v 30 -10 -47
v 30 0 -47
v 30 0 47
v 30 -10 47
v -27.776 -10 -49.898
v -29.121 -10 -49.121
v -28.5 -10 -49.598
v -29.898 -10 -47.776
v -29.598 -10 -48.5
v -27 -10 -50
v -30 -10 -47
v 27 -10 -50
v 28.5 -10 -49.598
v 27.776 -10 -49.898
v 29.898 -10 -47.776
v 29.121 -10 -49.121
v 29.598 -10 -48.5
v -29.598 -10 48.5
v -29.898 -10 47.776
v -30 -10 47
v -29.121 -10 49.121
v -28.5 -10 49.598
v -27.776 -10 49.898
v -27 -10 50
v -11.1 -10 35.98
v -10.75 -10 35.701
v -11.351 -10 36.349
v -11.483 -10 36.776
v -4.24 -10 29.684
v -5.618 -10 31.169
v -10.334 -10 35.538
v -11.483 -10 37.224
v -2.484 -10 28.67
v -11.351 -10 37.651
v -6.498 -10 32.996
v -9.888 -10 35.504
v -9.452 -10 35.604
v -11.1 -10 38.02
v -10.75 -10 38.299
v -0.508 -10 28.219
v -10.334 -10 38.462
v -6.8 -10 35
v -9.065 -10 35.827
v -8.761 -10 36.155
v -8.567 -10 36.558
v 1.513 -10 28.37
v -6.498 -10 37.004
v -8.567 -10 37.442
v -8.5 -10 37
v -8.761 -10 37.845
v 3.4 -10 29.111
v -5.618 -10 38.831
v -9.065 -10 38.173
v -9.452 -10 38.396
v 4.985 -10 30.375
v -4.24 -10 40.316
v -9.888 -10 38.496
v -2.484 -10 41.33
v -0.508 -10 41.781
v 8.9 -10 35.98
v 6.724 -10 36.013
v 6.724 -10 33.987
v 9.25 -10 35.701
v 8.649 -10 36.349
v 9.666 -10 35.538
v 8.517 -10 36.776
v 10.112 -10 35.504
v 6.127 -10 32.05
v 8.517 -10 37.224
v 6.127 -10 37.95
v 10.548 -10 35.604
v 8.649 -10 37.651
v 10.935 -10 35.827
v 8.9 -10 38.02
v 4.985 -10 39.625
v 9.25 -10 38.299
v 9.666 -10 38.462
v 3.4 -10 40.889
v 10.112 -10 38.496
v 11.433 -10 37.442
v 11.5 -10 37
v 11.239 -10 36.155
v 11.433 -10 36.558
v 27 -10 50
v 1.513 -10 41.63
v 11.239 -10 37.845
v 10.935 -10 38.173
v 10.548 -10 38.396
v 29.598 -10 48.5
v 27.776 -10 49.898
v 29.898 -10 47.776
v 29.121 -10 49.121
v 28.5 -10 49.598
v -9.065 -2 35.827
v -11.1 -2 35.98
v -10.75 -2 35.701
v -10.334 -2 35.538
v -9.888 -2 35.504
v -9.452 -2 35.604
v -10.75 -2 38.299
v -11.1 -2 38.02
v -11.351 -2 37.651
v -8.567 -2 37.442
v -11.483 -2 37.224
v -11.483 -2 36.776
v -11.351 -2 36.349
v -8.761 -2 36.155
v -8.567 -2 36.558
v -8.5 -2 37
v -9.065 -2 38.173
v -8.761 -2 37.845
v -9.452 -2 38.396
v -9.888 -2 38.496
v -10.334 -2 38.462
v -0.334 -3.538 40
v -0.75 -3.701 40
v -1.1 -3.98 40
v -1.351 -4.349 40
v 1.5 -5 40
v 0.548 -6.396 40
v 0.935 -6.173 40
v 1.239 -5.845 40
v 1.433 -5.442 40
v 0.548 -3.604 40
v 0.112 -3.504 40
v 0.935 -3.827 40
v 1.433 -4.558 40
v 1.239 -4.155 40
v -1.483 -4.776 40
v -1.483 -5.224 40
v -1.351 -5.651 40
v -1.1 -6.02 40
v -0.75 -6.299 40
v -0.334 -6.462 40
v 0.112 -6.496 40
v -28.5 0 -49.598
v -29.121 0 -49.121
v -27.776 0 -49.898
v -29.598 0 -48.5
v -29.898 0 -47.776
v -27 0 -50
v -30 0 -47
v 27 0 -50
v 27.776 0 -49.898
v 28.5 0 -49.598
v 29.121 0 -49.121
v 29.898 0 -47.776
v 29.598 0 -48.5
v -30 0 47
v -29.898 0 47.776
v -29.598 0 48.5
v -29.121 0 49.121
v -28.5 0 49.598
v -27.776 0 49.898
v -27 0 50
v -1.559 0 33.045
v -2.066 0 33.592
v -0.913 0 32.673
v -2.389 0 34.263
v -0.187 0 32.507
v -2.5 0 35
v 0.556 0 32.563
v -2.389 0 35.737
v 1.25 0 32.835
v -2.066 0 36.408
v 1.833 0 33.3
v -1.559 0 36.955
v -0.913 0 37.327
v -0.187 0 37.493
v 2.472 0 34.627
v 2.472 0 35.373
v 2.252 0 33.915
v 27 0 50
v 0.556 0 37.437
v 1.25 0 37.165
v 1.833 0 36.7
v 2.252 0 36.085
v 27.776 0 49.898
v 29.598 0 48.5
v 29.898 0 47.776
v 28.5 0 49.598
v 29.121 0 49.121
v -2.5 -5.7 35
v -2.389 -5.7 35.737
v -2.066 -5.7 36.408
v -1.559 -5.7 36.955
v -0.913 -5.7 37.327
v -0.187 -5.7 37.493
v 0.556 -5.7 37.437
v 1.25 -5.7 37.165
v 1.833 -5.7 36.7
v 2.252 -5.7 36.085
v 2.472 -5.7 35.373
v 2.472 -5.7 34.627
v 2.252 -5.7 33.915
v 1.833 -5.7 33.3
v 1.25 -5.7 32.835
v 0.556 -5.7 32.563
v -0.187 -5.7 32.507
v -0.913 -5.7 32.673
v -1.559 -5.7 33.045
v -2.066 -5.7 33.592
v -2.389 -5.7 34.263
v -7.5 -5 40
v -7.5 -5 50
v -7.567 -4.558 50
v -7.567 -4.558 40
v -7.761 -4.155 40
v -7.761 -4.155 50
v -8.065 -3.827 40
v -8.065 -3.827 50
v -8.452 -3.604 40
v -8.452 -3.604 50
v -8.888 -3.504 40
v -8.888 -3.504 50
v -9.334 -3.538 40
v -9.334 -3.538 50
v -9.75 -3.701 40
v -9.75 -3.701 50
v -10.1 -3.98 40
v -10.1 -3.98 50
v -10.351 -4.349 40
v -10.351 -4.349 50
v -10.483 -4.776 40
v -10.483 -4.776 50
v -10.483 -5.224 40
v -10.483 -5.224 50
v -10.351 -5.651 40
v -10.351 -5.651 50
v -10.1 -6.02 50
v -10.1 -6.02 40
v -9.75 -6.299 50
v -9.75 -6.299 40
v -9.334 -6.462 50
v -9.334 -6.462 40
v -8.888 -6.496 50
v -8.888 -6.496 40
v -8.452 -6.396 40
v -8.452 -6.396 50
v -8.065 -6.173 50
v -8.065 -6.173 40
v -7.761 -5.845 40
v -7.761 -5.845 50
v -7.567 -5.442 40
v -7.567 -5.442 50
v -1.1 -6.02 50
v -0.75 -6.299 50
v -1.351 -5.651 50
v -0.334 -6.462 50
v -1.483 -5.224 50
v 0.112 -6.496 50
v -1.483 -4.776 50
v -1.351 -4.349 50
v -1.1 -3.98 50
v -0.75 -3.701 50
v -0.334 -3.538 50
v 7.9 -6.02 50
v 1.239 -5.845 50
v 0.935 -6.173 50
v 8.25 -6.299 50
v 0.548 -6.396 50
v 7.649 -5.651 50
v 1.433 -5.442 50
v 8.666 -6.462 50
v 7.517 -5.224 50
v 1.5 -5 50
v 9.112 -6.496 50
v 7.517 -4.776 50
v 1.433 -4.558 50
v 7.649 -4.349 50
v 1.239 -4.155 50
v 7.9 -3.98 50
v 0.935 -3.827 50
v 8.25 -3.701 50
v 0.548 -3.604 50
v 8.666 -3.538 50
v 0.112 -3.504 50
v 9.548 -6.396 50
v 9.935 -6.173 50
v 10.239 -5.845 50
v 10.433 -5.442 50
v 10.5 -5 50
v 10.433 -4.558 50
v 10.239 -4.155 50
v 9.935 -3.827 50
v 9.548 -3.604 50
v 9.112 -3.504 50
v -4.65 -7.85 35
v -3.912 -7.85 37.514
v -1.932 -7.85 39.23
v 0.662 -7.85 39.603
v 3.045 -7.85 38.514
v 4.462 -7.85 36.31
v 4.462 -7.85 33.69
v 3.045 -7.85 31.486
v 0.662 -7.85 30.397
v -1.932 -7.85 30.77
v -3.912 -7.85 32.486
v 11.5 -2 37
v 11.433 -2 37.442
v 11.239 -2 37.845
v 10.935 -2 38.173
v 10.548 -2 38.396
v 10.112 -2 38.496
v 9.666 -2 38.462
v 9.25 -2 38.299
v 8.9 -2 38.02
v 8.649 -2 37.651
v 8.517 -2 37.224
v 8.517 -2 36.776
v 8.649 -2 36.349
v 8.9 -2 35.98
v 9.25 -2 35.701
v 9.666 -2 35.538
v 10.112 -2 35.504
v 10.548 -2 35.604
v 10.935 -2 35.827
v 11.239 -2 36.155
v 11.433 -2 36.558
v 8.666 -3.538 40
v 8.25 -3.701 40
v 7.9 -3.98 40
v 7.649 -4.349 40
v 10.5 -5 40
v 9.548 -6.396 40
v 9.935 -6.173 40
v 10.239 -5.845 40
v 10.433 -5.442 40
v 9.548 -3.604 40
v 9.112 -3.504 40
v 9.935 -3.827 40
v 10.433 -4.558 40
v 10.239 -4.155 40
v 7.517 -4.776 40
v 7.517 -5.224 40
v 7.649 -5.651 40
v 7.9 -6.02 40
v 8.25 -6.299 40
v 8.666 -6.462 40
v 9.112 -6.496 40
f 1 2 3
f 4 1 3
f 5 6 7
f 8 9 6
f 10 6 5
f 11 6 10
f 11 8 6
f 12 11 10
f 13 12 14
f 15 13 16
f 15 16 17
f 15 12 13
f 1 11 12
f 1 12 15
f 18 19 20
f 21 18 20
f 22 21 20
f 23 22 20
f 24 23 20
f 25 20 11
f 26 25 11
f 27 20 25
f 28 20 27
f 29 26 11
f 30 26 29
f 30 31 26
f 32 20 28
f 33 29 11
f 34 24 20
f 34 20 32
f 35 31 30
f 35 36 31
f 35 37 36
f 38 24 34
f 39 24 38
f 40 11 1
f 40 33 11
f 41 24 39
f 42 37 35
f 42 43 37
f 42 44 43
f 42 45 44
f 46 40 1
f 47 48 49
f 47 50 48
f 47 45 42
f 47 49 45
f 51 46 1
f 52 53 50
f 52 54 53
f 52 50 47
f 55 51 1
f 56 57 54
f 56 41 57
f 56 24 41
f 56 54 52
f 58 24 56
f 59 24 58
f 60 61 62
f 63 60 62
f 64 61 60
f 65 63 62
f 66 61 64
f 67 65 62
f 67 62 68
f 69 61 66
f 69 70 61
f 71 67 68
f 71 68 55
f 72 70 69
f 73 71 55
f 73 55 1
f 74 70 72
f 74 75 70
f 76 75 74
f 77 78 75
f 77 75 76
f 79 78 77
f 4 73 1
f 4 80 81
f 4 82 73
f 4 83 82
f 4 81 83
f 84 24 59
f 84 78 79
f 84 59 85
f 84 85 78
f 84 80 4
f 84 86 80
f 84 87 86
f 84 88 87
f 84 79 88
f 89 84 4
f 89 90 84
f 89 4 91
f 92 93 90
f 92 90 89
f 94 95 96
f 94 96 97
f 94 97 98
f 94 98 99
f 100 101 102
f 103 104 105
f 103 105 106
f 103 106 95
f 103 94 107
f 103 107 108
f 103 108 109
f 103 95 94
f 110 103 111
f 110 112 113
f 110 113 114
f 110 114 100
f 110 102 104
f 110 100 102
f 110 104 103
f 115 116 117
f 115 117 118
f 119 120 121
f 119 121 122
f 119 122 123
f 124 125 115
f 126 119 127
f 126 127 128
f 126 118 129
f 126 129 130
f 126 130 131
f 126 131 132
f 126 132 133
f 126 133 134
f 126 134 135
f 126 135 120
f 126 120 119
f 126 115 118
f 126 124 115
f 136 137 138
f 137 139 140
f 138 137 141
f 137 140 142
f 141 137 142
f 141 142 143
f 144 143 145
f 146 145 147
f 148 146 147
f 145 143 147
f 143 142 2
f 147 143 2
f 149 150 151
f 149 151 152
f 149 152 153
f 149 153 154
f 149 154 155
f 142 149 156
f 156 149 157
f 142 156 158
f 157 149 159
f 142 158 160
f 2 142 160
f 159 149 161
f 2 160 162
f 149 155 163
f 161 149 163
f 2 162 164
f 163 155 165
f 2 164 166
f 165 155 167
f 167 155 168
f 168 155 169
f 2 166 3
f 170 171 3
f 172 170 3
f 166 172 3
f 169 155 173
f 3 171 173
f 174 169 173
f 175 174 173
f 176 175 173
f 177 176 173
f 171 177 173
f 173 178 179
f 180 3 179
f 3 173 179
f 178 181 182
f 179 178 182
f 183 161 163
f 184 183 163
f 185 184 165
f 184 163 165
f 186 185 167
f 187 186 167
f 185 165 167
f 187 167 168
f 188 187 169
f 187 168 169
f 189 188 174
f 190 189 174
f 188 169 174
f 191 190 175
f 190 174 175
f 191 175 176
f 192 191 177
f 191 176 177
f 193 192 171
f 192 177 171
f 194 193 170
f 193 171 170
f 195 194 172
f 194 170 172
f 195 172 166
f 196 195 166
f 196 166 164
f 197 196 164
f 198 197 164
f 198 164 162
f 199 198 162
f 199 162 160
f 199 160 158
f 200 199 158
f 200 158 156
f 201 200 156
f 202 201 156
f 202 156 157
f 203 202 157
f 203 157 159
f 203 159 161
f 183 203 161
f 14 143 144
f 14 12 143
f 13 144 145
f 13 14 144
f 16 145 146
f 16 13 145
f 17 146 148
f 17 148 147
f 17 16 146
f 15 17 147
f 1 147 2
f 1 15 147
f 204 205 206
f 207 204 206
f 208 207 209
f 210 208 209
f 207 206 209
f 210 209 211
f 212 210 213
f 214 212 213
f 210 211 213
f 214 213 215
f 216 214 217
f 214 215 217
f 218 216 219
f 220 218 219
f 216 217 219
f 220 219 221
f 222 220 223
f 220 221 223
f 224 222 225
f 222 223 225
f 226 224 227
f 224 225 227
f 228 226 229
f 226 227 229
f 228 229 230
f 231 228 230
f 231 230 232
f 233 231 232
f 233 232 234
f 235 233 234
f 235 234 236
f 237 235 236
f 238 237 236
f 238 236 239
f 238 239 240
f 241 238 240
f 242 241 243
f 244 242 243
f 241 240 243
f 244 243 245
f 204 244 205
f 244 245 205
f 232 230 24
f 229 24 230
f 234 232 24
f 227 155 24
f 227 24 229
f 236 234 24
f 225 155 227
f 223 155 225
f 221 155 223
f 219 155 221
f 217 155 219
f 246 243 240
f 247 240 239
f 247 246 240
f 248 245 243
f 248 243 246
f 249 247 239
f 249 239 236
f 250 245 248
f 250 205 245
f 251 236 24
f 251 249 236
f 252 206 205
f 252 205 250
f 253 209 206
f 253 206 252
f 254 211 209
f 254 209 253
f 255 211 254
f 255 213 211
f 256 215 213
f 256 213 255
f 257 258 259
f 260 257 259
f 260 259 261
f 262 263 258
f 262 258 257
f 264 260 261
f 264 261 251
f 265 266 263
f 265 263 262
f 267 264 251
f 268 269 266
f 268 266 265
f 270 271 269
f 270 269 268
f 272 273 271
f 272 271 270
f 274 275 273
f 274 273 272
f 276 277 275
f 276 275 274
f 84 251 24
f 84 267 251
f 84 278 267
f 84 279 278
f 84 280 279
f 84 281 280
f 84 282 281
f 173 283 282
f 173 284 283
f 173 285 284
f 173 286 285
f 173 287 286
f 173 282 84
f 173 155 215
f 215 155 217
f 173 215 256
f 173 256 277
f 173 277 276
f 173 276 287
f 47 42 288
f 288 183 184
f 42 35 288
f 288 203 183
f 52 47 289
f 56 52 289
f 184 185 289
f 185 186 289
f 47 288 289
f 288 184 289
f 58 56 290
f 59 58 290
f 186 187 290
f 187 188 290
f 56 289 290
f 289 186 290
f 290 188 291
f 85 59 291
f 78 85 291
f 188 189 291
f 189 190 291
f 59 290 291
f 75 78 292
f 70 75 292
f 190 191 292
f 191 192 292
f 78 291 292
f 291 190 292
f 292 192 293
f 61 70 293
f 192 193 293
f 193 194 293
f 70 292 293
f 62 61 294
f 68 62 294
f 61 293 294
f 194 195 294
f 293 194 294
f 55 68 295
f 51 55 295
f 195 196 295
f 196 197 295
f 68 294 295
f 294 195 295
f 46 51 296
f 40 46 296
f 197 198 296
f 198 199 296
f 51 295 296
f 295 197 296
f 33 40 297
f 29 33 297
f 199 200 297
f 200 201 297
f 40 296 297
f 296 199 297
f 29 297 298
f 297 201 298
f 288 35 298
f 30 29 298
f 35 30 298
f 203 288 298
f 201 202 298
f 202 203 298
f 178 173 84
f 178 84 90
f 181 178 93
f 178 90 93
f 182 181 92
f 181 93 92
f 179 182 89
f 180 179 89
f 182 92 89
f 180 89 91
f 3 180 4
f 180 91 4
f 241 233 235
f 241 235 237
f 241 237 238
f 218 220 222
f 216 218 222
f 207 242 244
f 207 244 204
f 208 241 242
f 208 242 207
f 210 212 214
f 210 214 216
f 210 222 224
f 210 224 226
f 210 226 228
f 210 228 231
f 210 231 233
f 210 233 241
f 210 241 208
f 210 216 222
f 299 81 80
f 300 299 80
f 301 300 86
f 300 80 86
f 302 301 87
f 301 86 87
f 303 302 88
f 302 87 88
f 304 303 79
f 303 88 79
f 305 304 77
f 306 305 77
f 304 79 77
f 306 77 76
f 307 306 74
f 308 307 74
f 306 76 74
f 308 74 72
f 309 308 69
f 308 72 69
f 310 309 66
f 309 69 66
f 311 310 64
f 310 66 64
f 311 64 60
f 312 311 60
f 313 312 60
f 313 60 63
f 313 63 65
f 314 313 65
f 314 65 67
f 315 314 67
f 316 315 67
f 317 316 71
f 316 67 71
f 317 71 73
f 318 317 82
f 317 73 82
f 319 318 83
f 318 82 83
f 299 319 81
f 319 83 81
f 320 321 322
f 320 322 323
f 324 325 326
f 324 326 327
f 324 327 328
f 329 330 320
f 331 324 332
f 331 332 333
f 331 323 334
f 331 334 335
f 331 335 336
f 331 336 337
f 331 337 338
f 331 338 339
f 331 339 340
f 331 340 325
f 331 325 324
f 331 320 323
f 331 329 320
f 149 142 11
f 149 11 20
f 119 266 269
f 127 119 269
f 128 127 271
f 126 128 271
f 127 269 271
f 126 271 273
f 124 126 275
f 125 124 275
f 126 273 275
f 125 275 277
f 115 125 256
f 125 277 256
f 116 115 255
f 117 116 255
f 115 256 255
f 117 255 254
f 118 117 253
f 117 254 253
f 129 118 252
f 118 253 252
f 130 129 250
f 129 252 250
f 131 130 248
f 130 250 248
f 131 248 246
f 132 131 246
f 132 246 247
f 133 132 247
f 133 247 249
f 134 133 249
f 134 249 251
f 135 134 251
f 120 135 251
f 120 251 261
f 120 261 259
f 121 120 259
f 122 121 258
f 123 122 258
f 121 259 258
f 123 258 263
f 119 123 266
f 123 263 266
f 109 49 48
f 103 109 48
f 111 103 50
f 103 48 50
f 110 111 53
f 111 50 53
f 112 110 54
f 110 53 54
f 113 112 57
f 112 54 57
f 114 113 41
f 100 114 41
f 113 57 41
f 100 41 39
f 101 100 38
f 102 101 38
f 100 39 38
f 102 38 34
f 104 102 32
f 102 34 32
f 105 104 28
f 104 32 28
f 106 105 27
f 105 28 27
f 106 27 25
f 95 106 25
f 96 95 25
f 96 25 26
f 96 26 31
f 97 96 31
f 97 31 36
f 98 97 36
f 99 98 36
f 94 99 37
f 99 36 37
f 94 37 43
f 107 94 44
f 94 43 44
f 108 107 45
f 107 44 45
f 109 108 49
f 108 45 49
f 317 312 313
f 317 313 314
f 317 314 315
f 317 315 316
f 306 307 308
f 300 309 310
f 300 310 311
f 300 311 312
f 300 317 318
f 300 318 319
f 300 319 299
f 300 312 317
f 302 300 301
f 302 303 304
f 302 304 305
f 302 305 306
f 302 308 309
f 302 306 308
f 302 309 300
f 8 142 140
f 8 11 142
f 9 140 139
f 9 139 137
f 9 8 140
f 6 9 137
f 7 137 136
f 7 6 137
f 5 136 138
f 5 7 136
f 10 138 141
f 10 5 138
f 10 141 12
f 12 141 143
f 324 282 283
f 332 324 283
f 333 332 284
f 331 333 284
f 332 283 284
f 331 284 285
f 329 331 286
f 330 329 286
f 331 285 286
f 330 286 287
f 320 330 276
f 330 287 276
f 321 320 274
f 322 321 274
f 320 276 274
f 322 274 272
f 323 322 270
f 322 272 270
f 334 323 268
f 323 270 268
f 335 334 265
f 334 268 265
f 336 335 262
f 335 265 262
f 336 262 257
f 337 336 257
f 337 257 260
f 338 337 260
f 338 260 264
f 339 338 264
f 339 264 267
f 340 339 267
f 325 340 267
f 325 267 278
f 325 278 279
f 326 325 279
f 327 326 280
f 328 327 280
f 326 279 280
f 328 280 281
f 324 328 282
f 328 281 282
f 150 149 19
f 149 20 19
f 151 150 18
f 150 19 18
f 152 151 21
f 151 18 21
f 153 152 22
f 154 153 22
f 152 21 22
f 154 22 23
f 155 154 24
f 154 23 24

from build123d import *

# Parameters (mm, degrees)
F0_W     = 60
F0_H     = 100
F1_DEPTH = 10
F2_R     = 1.5
F3_DEPTH = 8
F4_R     = 1.5
F5_DEPTH = 10
F6_R     = 2.5
F7_DEPTH = 25
F8_SIZE  = 4.3
F9_R     = 3


with BuildPart() as f1:
    # F0 (on Front) → F1 (new body)
    with BuildSketch(Plane.XZ):
        Rectangle(F0_W, F0_H)
    extrude(amount=F1_DEPTH)

    # F2 (on face) → F3 (cut)
    with BuildSketch(Plane.XZ.offset(10)):
        with Locations((10, 37)):
            Circle(F2_R)
        with Locations((-10, 37)):
            Circle(F2_R)
    extrude(amount=-F3_DEPTH, mode=Mode.SUBTRACT)

    # F4 (on face) → F5 (cut)
    with BuildSketch(Plane.XY.offset(50)):
        with Locations((9, -5)):
            Circle(F4_R)
        with Locations((0, -5)):
            Circle(F4_R)
        with Locations((-9, -5)):
            Circle(F4_R)
    extrude(amount=-F5_DEPTH, mode=Mode.SUBTRACT)

    # F6 (on face) → F7 (cut)
    with BuildSketch(Plane(origin=(0, 0, 0), x_dir=(-1, 0, 0), z_dir=(0, 1, 0))):
        with Locations((0, 35)):
            Circle(F6_R)
    extrude(amount=-F7_DEPTH, mode=Mode.SUBTRACT)

    # F8
    f8_edges = [f1.edges().sort_by_distance(p)[0] for p in [
        (2.5, -10, 35),
    ]]
    chamfer(f8_edges, length=F8_SIZE)

    # F9
    f9_edges = [f1.edges().sort_by_distance(p)[0] for p in [
        (30, -5, -50),
        (-30, -5, -50),
        (-30, -5, 50),
        (30, -5, 50),
    ]]
    fillet(f9_edges, radius=F9_R)


solid = f1.part
